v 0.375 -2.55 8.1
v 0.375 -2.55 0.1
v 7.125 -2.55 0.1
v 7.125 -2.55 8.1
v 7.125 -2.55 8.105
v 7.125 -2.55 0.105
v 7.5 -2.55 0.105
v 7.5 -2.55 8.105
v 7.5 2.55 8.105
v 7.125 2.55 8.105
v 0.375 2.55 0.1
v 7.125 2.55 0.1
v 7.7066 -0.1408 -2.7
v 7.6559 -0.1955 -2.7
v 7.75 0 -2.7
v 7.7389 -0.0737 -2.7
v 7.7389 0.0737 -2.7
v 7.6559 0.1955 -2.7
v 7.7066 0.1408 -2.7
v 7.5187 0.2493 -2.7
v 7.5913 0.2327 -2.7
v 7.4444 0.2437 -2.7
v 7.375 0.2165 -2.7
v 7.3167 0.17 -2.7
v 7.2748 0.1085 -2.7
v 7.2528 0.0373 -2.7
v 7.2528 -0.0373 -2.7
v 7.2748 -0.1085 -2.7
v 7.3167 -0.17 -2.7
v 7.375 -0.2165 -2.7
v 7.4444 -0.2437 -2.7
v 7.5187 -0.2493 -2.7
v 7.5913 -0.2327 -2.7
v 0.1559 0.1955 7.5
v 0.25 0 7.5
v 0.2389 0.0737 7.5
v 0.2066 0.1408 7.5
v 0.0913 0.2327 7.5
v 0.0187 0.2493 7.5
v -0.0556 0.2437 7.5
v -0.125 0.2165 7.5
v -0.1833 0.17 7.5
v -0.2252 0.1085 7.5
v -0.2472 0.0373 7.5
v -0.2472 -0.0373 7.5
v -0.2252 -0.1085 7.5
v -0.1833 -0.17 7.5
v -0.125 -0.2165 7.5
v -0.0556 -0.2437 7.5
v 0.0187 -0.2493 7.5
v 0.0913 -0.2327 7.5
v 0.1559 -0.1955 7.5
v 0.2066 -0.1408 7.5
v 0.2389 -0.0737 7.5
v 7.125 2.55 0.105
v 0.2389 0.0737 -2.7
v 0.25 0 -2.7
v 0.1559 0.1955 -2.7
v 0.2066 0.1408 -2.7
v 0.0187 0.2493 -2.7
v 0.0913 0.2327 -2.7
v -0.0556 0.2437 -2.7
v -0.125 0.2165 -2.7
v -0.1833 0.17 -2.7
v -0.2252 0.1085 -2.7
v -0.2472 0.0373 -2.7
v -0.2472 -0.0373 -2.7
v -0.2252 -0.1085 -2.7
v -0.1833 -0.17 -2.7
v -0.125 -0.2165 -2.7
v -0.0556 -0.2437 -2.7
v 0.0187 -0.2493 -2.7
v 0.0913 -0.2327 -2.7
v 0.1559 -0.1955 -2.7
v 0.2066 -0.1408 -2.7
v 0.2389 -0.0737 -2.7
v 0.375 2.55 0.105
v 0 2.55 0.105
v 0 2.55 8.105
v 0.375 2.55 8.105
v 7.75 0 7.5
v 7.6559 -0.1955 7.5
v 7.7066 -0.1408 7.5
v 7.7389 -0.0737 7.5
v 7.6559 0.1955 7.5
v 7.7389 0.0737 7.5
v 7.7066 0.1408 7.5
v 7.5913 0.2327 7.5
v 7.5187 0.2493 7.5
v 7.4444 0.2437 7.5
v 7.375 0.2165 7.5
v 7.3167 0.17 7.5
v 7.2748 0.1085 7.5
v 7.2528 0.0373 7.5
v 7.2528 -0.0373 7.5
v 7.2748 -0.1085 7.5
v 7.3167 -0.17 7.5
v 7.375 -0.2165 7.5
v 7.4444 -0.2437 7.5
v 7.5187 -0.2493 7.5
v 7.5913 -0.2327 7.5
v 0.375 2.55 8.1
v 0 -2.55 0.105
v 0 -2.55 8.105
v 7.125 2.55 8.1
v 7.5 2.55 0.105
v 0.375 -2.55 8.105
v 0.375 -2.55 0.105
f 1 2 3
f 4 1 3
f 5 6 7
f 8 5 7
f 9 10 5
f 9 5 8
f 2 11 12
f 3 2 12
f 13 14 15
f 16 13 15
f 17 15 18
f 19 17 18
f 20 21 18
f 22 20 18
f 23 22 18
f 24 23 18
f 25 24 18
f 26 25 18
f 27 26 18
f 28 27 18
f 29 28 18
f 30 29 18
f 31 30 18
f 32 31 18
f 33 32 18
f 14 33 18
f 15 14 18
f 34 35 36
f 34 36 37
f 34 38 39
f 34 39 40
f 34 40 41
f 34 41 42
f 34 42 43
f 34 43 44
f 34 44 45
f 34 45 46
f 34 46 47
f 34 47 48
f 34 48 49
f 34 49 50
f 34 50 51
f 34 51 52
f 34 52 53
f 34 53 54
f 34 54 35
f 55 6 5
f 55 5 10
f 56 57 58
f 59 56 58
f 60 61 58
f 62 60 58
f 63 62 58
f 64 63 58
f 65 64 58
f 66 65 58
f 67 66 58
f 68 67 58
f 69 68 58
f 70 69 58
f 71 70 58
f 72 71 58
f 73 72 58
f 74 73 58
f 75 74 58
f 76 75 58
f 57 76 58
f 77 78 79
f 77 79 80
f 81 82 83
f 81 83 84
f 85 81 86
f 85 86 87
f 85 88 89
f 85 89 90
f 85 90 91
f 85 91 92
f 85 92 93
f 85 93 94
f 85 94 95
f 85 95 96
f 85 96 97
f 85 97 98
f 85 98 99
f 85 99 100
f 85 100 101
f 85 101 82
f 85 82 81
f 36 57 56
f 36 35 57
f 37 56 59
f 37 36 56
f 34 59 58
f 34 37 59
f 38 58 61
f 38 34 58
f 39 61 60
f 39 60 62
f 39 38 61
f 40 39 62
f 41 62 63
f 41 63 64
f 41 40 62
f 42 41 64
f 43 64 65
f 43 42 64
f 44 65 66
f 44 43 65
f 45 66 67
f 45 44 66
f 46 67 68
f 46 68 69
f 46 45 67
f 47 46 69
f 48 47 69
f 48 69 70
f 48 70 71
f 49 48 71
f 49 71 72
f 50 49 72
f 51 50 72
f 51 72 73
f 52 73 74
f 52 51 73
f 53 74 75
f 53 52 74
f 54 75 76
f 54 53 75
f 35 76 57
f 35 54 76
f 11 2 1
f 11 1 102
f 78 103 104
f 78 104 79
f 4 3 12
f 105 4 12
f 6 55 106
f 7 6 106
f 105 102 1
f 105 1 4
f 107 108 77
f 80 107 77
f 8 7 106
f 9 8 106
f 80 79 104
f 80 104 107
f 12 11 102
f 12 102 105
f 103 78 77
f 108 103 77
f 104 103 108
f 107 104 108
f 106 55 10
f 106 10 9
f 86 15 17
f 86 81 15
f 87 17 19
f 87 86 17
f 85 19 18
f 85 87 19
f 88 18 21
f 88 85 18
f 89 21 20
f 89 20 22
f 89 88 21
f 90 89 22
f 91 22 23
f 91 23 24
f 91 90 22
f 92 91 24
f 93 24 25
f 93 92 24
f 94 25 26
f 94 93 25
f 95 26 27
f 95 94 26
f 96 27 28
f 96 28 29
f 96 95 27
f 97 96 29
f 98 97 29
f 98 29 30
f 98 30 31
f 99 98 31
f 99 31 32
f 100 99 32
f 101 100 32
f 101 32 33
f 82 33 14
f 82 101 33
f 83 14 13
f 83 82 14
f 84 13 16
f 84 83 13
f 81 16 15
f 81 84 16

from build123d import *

# Parameters (mm, degrees)
SKETCH_W          = 6.75
SKETCH_H          = 5.1
PAD_DEPTH         = 8
SKETCH001_R       = 0.25
PAD001_DEPTH      = 7
PAD001_DEPTH_BACK = 3.2
SKETCH002_W       = 0.375
SKETCH002_H       = 5.1
PAD002_DEPTH      = 8


with BuildPart() as pad:
    # Sketch → Pad (new body)
    with BuildSketch(Plane.XY.offset(0.1)):
        with Locations((3.75, 0)):
            Rectangle(SKETCH_W, SKETCH_H)
    extrude(amount=PAD_DEPTH)


with BuildPart() as pad001:
    # Sketch001 → Pad001 (new body, two sides)
    with BuildSketch(Plane.XY.offset(0.5)) as pad001_sk:
        Circle(SKETCH001_R)
        with Locations((7.5, 0)):
            Circle(SKETCH001_R)
    extrude(amount=PAD001_DEPTH)
    extrude(pad001_sk.sketch, amount=-PAD001_DEPTH_BACK)


with BuildPart() as pad002:
    # Sketch002 → Pad002 (new body)
    with BuildSketch(Plane.XY.offset(0.105)):
        with Locations((0.1875, 0)):
            Rectangle(SKETCH002_W, SKETCH002_H)
        with Locations((7.3125, 0)):
            Rectangle(SKETCH002_W, SKETCH002_H)
    extrude(amount=PAD002_DEPTH)


solid = Compound([pad.part, pad001.part, pad002.part])
